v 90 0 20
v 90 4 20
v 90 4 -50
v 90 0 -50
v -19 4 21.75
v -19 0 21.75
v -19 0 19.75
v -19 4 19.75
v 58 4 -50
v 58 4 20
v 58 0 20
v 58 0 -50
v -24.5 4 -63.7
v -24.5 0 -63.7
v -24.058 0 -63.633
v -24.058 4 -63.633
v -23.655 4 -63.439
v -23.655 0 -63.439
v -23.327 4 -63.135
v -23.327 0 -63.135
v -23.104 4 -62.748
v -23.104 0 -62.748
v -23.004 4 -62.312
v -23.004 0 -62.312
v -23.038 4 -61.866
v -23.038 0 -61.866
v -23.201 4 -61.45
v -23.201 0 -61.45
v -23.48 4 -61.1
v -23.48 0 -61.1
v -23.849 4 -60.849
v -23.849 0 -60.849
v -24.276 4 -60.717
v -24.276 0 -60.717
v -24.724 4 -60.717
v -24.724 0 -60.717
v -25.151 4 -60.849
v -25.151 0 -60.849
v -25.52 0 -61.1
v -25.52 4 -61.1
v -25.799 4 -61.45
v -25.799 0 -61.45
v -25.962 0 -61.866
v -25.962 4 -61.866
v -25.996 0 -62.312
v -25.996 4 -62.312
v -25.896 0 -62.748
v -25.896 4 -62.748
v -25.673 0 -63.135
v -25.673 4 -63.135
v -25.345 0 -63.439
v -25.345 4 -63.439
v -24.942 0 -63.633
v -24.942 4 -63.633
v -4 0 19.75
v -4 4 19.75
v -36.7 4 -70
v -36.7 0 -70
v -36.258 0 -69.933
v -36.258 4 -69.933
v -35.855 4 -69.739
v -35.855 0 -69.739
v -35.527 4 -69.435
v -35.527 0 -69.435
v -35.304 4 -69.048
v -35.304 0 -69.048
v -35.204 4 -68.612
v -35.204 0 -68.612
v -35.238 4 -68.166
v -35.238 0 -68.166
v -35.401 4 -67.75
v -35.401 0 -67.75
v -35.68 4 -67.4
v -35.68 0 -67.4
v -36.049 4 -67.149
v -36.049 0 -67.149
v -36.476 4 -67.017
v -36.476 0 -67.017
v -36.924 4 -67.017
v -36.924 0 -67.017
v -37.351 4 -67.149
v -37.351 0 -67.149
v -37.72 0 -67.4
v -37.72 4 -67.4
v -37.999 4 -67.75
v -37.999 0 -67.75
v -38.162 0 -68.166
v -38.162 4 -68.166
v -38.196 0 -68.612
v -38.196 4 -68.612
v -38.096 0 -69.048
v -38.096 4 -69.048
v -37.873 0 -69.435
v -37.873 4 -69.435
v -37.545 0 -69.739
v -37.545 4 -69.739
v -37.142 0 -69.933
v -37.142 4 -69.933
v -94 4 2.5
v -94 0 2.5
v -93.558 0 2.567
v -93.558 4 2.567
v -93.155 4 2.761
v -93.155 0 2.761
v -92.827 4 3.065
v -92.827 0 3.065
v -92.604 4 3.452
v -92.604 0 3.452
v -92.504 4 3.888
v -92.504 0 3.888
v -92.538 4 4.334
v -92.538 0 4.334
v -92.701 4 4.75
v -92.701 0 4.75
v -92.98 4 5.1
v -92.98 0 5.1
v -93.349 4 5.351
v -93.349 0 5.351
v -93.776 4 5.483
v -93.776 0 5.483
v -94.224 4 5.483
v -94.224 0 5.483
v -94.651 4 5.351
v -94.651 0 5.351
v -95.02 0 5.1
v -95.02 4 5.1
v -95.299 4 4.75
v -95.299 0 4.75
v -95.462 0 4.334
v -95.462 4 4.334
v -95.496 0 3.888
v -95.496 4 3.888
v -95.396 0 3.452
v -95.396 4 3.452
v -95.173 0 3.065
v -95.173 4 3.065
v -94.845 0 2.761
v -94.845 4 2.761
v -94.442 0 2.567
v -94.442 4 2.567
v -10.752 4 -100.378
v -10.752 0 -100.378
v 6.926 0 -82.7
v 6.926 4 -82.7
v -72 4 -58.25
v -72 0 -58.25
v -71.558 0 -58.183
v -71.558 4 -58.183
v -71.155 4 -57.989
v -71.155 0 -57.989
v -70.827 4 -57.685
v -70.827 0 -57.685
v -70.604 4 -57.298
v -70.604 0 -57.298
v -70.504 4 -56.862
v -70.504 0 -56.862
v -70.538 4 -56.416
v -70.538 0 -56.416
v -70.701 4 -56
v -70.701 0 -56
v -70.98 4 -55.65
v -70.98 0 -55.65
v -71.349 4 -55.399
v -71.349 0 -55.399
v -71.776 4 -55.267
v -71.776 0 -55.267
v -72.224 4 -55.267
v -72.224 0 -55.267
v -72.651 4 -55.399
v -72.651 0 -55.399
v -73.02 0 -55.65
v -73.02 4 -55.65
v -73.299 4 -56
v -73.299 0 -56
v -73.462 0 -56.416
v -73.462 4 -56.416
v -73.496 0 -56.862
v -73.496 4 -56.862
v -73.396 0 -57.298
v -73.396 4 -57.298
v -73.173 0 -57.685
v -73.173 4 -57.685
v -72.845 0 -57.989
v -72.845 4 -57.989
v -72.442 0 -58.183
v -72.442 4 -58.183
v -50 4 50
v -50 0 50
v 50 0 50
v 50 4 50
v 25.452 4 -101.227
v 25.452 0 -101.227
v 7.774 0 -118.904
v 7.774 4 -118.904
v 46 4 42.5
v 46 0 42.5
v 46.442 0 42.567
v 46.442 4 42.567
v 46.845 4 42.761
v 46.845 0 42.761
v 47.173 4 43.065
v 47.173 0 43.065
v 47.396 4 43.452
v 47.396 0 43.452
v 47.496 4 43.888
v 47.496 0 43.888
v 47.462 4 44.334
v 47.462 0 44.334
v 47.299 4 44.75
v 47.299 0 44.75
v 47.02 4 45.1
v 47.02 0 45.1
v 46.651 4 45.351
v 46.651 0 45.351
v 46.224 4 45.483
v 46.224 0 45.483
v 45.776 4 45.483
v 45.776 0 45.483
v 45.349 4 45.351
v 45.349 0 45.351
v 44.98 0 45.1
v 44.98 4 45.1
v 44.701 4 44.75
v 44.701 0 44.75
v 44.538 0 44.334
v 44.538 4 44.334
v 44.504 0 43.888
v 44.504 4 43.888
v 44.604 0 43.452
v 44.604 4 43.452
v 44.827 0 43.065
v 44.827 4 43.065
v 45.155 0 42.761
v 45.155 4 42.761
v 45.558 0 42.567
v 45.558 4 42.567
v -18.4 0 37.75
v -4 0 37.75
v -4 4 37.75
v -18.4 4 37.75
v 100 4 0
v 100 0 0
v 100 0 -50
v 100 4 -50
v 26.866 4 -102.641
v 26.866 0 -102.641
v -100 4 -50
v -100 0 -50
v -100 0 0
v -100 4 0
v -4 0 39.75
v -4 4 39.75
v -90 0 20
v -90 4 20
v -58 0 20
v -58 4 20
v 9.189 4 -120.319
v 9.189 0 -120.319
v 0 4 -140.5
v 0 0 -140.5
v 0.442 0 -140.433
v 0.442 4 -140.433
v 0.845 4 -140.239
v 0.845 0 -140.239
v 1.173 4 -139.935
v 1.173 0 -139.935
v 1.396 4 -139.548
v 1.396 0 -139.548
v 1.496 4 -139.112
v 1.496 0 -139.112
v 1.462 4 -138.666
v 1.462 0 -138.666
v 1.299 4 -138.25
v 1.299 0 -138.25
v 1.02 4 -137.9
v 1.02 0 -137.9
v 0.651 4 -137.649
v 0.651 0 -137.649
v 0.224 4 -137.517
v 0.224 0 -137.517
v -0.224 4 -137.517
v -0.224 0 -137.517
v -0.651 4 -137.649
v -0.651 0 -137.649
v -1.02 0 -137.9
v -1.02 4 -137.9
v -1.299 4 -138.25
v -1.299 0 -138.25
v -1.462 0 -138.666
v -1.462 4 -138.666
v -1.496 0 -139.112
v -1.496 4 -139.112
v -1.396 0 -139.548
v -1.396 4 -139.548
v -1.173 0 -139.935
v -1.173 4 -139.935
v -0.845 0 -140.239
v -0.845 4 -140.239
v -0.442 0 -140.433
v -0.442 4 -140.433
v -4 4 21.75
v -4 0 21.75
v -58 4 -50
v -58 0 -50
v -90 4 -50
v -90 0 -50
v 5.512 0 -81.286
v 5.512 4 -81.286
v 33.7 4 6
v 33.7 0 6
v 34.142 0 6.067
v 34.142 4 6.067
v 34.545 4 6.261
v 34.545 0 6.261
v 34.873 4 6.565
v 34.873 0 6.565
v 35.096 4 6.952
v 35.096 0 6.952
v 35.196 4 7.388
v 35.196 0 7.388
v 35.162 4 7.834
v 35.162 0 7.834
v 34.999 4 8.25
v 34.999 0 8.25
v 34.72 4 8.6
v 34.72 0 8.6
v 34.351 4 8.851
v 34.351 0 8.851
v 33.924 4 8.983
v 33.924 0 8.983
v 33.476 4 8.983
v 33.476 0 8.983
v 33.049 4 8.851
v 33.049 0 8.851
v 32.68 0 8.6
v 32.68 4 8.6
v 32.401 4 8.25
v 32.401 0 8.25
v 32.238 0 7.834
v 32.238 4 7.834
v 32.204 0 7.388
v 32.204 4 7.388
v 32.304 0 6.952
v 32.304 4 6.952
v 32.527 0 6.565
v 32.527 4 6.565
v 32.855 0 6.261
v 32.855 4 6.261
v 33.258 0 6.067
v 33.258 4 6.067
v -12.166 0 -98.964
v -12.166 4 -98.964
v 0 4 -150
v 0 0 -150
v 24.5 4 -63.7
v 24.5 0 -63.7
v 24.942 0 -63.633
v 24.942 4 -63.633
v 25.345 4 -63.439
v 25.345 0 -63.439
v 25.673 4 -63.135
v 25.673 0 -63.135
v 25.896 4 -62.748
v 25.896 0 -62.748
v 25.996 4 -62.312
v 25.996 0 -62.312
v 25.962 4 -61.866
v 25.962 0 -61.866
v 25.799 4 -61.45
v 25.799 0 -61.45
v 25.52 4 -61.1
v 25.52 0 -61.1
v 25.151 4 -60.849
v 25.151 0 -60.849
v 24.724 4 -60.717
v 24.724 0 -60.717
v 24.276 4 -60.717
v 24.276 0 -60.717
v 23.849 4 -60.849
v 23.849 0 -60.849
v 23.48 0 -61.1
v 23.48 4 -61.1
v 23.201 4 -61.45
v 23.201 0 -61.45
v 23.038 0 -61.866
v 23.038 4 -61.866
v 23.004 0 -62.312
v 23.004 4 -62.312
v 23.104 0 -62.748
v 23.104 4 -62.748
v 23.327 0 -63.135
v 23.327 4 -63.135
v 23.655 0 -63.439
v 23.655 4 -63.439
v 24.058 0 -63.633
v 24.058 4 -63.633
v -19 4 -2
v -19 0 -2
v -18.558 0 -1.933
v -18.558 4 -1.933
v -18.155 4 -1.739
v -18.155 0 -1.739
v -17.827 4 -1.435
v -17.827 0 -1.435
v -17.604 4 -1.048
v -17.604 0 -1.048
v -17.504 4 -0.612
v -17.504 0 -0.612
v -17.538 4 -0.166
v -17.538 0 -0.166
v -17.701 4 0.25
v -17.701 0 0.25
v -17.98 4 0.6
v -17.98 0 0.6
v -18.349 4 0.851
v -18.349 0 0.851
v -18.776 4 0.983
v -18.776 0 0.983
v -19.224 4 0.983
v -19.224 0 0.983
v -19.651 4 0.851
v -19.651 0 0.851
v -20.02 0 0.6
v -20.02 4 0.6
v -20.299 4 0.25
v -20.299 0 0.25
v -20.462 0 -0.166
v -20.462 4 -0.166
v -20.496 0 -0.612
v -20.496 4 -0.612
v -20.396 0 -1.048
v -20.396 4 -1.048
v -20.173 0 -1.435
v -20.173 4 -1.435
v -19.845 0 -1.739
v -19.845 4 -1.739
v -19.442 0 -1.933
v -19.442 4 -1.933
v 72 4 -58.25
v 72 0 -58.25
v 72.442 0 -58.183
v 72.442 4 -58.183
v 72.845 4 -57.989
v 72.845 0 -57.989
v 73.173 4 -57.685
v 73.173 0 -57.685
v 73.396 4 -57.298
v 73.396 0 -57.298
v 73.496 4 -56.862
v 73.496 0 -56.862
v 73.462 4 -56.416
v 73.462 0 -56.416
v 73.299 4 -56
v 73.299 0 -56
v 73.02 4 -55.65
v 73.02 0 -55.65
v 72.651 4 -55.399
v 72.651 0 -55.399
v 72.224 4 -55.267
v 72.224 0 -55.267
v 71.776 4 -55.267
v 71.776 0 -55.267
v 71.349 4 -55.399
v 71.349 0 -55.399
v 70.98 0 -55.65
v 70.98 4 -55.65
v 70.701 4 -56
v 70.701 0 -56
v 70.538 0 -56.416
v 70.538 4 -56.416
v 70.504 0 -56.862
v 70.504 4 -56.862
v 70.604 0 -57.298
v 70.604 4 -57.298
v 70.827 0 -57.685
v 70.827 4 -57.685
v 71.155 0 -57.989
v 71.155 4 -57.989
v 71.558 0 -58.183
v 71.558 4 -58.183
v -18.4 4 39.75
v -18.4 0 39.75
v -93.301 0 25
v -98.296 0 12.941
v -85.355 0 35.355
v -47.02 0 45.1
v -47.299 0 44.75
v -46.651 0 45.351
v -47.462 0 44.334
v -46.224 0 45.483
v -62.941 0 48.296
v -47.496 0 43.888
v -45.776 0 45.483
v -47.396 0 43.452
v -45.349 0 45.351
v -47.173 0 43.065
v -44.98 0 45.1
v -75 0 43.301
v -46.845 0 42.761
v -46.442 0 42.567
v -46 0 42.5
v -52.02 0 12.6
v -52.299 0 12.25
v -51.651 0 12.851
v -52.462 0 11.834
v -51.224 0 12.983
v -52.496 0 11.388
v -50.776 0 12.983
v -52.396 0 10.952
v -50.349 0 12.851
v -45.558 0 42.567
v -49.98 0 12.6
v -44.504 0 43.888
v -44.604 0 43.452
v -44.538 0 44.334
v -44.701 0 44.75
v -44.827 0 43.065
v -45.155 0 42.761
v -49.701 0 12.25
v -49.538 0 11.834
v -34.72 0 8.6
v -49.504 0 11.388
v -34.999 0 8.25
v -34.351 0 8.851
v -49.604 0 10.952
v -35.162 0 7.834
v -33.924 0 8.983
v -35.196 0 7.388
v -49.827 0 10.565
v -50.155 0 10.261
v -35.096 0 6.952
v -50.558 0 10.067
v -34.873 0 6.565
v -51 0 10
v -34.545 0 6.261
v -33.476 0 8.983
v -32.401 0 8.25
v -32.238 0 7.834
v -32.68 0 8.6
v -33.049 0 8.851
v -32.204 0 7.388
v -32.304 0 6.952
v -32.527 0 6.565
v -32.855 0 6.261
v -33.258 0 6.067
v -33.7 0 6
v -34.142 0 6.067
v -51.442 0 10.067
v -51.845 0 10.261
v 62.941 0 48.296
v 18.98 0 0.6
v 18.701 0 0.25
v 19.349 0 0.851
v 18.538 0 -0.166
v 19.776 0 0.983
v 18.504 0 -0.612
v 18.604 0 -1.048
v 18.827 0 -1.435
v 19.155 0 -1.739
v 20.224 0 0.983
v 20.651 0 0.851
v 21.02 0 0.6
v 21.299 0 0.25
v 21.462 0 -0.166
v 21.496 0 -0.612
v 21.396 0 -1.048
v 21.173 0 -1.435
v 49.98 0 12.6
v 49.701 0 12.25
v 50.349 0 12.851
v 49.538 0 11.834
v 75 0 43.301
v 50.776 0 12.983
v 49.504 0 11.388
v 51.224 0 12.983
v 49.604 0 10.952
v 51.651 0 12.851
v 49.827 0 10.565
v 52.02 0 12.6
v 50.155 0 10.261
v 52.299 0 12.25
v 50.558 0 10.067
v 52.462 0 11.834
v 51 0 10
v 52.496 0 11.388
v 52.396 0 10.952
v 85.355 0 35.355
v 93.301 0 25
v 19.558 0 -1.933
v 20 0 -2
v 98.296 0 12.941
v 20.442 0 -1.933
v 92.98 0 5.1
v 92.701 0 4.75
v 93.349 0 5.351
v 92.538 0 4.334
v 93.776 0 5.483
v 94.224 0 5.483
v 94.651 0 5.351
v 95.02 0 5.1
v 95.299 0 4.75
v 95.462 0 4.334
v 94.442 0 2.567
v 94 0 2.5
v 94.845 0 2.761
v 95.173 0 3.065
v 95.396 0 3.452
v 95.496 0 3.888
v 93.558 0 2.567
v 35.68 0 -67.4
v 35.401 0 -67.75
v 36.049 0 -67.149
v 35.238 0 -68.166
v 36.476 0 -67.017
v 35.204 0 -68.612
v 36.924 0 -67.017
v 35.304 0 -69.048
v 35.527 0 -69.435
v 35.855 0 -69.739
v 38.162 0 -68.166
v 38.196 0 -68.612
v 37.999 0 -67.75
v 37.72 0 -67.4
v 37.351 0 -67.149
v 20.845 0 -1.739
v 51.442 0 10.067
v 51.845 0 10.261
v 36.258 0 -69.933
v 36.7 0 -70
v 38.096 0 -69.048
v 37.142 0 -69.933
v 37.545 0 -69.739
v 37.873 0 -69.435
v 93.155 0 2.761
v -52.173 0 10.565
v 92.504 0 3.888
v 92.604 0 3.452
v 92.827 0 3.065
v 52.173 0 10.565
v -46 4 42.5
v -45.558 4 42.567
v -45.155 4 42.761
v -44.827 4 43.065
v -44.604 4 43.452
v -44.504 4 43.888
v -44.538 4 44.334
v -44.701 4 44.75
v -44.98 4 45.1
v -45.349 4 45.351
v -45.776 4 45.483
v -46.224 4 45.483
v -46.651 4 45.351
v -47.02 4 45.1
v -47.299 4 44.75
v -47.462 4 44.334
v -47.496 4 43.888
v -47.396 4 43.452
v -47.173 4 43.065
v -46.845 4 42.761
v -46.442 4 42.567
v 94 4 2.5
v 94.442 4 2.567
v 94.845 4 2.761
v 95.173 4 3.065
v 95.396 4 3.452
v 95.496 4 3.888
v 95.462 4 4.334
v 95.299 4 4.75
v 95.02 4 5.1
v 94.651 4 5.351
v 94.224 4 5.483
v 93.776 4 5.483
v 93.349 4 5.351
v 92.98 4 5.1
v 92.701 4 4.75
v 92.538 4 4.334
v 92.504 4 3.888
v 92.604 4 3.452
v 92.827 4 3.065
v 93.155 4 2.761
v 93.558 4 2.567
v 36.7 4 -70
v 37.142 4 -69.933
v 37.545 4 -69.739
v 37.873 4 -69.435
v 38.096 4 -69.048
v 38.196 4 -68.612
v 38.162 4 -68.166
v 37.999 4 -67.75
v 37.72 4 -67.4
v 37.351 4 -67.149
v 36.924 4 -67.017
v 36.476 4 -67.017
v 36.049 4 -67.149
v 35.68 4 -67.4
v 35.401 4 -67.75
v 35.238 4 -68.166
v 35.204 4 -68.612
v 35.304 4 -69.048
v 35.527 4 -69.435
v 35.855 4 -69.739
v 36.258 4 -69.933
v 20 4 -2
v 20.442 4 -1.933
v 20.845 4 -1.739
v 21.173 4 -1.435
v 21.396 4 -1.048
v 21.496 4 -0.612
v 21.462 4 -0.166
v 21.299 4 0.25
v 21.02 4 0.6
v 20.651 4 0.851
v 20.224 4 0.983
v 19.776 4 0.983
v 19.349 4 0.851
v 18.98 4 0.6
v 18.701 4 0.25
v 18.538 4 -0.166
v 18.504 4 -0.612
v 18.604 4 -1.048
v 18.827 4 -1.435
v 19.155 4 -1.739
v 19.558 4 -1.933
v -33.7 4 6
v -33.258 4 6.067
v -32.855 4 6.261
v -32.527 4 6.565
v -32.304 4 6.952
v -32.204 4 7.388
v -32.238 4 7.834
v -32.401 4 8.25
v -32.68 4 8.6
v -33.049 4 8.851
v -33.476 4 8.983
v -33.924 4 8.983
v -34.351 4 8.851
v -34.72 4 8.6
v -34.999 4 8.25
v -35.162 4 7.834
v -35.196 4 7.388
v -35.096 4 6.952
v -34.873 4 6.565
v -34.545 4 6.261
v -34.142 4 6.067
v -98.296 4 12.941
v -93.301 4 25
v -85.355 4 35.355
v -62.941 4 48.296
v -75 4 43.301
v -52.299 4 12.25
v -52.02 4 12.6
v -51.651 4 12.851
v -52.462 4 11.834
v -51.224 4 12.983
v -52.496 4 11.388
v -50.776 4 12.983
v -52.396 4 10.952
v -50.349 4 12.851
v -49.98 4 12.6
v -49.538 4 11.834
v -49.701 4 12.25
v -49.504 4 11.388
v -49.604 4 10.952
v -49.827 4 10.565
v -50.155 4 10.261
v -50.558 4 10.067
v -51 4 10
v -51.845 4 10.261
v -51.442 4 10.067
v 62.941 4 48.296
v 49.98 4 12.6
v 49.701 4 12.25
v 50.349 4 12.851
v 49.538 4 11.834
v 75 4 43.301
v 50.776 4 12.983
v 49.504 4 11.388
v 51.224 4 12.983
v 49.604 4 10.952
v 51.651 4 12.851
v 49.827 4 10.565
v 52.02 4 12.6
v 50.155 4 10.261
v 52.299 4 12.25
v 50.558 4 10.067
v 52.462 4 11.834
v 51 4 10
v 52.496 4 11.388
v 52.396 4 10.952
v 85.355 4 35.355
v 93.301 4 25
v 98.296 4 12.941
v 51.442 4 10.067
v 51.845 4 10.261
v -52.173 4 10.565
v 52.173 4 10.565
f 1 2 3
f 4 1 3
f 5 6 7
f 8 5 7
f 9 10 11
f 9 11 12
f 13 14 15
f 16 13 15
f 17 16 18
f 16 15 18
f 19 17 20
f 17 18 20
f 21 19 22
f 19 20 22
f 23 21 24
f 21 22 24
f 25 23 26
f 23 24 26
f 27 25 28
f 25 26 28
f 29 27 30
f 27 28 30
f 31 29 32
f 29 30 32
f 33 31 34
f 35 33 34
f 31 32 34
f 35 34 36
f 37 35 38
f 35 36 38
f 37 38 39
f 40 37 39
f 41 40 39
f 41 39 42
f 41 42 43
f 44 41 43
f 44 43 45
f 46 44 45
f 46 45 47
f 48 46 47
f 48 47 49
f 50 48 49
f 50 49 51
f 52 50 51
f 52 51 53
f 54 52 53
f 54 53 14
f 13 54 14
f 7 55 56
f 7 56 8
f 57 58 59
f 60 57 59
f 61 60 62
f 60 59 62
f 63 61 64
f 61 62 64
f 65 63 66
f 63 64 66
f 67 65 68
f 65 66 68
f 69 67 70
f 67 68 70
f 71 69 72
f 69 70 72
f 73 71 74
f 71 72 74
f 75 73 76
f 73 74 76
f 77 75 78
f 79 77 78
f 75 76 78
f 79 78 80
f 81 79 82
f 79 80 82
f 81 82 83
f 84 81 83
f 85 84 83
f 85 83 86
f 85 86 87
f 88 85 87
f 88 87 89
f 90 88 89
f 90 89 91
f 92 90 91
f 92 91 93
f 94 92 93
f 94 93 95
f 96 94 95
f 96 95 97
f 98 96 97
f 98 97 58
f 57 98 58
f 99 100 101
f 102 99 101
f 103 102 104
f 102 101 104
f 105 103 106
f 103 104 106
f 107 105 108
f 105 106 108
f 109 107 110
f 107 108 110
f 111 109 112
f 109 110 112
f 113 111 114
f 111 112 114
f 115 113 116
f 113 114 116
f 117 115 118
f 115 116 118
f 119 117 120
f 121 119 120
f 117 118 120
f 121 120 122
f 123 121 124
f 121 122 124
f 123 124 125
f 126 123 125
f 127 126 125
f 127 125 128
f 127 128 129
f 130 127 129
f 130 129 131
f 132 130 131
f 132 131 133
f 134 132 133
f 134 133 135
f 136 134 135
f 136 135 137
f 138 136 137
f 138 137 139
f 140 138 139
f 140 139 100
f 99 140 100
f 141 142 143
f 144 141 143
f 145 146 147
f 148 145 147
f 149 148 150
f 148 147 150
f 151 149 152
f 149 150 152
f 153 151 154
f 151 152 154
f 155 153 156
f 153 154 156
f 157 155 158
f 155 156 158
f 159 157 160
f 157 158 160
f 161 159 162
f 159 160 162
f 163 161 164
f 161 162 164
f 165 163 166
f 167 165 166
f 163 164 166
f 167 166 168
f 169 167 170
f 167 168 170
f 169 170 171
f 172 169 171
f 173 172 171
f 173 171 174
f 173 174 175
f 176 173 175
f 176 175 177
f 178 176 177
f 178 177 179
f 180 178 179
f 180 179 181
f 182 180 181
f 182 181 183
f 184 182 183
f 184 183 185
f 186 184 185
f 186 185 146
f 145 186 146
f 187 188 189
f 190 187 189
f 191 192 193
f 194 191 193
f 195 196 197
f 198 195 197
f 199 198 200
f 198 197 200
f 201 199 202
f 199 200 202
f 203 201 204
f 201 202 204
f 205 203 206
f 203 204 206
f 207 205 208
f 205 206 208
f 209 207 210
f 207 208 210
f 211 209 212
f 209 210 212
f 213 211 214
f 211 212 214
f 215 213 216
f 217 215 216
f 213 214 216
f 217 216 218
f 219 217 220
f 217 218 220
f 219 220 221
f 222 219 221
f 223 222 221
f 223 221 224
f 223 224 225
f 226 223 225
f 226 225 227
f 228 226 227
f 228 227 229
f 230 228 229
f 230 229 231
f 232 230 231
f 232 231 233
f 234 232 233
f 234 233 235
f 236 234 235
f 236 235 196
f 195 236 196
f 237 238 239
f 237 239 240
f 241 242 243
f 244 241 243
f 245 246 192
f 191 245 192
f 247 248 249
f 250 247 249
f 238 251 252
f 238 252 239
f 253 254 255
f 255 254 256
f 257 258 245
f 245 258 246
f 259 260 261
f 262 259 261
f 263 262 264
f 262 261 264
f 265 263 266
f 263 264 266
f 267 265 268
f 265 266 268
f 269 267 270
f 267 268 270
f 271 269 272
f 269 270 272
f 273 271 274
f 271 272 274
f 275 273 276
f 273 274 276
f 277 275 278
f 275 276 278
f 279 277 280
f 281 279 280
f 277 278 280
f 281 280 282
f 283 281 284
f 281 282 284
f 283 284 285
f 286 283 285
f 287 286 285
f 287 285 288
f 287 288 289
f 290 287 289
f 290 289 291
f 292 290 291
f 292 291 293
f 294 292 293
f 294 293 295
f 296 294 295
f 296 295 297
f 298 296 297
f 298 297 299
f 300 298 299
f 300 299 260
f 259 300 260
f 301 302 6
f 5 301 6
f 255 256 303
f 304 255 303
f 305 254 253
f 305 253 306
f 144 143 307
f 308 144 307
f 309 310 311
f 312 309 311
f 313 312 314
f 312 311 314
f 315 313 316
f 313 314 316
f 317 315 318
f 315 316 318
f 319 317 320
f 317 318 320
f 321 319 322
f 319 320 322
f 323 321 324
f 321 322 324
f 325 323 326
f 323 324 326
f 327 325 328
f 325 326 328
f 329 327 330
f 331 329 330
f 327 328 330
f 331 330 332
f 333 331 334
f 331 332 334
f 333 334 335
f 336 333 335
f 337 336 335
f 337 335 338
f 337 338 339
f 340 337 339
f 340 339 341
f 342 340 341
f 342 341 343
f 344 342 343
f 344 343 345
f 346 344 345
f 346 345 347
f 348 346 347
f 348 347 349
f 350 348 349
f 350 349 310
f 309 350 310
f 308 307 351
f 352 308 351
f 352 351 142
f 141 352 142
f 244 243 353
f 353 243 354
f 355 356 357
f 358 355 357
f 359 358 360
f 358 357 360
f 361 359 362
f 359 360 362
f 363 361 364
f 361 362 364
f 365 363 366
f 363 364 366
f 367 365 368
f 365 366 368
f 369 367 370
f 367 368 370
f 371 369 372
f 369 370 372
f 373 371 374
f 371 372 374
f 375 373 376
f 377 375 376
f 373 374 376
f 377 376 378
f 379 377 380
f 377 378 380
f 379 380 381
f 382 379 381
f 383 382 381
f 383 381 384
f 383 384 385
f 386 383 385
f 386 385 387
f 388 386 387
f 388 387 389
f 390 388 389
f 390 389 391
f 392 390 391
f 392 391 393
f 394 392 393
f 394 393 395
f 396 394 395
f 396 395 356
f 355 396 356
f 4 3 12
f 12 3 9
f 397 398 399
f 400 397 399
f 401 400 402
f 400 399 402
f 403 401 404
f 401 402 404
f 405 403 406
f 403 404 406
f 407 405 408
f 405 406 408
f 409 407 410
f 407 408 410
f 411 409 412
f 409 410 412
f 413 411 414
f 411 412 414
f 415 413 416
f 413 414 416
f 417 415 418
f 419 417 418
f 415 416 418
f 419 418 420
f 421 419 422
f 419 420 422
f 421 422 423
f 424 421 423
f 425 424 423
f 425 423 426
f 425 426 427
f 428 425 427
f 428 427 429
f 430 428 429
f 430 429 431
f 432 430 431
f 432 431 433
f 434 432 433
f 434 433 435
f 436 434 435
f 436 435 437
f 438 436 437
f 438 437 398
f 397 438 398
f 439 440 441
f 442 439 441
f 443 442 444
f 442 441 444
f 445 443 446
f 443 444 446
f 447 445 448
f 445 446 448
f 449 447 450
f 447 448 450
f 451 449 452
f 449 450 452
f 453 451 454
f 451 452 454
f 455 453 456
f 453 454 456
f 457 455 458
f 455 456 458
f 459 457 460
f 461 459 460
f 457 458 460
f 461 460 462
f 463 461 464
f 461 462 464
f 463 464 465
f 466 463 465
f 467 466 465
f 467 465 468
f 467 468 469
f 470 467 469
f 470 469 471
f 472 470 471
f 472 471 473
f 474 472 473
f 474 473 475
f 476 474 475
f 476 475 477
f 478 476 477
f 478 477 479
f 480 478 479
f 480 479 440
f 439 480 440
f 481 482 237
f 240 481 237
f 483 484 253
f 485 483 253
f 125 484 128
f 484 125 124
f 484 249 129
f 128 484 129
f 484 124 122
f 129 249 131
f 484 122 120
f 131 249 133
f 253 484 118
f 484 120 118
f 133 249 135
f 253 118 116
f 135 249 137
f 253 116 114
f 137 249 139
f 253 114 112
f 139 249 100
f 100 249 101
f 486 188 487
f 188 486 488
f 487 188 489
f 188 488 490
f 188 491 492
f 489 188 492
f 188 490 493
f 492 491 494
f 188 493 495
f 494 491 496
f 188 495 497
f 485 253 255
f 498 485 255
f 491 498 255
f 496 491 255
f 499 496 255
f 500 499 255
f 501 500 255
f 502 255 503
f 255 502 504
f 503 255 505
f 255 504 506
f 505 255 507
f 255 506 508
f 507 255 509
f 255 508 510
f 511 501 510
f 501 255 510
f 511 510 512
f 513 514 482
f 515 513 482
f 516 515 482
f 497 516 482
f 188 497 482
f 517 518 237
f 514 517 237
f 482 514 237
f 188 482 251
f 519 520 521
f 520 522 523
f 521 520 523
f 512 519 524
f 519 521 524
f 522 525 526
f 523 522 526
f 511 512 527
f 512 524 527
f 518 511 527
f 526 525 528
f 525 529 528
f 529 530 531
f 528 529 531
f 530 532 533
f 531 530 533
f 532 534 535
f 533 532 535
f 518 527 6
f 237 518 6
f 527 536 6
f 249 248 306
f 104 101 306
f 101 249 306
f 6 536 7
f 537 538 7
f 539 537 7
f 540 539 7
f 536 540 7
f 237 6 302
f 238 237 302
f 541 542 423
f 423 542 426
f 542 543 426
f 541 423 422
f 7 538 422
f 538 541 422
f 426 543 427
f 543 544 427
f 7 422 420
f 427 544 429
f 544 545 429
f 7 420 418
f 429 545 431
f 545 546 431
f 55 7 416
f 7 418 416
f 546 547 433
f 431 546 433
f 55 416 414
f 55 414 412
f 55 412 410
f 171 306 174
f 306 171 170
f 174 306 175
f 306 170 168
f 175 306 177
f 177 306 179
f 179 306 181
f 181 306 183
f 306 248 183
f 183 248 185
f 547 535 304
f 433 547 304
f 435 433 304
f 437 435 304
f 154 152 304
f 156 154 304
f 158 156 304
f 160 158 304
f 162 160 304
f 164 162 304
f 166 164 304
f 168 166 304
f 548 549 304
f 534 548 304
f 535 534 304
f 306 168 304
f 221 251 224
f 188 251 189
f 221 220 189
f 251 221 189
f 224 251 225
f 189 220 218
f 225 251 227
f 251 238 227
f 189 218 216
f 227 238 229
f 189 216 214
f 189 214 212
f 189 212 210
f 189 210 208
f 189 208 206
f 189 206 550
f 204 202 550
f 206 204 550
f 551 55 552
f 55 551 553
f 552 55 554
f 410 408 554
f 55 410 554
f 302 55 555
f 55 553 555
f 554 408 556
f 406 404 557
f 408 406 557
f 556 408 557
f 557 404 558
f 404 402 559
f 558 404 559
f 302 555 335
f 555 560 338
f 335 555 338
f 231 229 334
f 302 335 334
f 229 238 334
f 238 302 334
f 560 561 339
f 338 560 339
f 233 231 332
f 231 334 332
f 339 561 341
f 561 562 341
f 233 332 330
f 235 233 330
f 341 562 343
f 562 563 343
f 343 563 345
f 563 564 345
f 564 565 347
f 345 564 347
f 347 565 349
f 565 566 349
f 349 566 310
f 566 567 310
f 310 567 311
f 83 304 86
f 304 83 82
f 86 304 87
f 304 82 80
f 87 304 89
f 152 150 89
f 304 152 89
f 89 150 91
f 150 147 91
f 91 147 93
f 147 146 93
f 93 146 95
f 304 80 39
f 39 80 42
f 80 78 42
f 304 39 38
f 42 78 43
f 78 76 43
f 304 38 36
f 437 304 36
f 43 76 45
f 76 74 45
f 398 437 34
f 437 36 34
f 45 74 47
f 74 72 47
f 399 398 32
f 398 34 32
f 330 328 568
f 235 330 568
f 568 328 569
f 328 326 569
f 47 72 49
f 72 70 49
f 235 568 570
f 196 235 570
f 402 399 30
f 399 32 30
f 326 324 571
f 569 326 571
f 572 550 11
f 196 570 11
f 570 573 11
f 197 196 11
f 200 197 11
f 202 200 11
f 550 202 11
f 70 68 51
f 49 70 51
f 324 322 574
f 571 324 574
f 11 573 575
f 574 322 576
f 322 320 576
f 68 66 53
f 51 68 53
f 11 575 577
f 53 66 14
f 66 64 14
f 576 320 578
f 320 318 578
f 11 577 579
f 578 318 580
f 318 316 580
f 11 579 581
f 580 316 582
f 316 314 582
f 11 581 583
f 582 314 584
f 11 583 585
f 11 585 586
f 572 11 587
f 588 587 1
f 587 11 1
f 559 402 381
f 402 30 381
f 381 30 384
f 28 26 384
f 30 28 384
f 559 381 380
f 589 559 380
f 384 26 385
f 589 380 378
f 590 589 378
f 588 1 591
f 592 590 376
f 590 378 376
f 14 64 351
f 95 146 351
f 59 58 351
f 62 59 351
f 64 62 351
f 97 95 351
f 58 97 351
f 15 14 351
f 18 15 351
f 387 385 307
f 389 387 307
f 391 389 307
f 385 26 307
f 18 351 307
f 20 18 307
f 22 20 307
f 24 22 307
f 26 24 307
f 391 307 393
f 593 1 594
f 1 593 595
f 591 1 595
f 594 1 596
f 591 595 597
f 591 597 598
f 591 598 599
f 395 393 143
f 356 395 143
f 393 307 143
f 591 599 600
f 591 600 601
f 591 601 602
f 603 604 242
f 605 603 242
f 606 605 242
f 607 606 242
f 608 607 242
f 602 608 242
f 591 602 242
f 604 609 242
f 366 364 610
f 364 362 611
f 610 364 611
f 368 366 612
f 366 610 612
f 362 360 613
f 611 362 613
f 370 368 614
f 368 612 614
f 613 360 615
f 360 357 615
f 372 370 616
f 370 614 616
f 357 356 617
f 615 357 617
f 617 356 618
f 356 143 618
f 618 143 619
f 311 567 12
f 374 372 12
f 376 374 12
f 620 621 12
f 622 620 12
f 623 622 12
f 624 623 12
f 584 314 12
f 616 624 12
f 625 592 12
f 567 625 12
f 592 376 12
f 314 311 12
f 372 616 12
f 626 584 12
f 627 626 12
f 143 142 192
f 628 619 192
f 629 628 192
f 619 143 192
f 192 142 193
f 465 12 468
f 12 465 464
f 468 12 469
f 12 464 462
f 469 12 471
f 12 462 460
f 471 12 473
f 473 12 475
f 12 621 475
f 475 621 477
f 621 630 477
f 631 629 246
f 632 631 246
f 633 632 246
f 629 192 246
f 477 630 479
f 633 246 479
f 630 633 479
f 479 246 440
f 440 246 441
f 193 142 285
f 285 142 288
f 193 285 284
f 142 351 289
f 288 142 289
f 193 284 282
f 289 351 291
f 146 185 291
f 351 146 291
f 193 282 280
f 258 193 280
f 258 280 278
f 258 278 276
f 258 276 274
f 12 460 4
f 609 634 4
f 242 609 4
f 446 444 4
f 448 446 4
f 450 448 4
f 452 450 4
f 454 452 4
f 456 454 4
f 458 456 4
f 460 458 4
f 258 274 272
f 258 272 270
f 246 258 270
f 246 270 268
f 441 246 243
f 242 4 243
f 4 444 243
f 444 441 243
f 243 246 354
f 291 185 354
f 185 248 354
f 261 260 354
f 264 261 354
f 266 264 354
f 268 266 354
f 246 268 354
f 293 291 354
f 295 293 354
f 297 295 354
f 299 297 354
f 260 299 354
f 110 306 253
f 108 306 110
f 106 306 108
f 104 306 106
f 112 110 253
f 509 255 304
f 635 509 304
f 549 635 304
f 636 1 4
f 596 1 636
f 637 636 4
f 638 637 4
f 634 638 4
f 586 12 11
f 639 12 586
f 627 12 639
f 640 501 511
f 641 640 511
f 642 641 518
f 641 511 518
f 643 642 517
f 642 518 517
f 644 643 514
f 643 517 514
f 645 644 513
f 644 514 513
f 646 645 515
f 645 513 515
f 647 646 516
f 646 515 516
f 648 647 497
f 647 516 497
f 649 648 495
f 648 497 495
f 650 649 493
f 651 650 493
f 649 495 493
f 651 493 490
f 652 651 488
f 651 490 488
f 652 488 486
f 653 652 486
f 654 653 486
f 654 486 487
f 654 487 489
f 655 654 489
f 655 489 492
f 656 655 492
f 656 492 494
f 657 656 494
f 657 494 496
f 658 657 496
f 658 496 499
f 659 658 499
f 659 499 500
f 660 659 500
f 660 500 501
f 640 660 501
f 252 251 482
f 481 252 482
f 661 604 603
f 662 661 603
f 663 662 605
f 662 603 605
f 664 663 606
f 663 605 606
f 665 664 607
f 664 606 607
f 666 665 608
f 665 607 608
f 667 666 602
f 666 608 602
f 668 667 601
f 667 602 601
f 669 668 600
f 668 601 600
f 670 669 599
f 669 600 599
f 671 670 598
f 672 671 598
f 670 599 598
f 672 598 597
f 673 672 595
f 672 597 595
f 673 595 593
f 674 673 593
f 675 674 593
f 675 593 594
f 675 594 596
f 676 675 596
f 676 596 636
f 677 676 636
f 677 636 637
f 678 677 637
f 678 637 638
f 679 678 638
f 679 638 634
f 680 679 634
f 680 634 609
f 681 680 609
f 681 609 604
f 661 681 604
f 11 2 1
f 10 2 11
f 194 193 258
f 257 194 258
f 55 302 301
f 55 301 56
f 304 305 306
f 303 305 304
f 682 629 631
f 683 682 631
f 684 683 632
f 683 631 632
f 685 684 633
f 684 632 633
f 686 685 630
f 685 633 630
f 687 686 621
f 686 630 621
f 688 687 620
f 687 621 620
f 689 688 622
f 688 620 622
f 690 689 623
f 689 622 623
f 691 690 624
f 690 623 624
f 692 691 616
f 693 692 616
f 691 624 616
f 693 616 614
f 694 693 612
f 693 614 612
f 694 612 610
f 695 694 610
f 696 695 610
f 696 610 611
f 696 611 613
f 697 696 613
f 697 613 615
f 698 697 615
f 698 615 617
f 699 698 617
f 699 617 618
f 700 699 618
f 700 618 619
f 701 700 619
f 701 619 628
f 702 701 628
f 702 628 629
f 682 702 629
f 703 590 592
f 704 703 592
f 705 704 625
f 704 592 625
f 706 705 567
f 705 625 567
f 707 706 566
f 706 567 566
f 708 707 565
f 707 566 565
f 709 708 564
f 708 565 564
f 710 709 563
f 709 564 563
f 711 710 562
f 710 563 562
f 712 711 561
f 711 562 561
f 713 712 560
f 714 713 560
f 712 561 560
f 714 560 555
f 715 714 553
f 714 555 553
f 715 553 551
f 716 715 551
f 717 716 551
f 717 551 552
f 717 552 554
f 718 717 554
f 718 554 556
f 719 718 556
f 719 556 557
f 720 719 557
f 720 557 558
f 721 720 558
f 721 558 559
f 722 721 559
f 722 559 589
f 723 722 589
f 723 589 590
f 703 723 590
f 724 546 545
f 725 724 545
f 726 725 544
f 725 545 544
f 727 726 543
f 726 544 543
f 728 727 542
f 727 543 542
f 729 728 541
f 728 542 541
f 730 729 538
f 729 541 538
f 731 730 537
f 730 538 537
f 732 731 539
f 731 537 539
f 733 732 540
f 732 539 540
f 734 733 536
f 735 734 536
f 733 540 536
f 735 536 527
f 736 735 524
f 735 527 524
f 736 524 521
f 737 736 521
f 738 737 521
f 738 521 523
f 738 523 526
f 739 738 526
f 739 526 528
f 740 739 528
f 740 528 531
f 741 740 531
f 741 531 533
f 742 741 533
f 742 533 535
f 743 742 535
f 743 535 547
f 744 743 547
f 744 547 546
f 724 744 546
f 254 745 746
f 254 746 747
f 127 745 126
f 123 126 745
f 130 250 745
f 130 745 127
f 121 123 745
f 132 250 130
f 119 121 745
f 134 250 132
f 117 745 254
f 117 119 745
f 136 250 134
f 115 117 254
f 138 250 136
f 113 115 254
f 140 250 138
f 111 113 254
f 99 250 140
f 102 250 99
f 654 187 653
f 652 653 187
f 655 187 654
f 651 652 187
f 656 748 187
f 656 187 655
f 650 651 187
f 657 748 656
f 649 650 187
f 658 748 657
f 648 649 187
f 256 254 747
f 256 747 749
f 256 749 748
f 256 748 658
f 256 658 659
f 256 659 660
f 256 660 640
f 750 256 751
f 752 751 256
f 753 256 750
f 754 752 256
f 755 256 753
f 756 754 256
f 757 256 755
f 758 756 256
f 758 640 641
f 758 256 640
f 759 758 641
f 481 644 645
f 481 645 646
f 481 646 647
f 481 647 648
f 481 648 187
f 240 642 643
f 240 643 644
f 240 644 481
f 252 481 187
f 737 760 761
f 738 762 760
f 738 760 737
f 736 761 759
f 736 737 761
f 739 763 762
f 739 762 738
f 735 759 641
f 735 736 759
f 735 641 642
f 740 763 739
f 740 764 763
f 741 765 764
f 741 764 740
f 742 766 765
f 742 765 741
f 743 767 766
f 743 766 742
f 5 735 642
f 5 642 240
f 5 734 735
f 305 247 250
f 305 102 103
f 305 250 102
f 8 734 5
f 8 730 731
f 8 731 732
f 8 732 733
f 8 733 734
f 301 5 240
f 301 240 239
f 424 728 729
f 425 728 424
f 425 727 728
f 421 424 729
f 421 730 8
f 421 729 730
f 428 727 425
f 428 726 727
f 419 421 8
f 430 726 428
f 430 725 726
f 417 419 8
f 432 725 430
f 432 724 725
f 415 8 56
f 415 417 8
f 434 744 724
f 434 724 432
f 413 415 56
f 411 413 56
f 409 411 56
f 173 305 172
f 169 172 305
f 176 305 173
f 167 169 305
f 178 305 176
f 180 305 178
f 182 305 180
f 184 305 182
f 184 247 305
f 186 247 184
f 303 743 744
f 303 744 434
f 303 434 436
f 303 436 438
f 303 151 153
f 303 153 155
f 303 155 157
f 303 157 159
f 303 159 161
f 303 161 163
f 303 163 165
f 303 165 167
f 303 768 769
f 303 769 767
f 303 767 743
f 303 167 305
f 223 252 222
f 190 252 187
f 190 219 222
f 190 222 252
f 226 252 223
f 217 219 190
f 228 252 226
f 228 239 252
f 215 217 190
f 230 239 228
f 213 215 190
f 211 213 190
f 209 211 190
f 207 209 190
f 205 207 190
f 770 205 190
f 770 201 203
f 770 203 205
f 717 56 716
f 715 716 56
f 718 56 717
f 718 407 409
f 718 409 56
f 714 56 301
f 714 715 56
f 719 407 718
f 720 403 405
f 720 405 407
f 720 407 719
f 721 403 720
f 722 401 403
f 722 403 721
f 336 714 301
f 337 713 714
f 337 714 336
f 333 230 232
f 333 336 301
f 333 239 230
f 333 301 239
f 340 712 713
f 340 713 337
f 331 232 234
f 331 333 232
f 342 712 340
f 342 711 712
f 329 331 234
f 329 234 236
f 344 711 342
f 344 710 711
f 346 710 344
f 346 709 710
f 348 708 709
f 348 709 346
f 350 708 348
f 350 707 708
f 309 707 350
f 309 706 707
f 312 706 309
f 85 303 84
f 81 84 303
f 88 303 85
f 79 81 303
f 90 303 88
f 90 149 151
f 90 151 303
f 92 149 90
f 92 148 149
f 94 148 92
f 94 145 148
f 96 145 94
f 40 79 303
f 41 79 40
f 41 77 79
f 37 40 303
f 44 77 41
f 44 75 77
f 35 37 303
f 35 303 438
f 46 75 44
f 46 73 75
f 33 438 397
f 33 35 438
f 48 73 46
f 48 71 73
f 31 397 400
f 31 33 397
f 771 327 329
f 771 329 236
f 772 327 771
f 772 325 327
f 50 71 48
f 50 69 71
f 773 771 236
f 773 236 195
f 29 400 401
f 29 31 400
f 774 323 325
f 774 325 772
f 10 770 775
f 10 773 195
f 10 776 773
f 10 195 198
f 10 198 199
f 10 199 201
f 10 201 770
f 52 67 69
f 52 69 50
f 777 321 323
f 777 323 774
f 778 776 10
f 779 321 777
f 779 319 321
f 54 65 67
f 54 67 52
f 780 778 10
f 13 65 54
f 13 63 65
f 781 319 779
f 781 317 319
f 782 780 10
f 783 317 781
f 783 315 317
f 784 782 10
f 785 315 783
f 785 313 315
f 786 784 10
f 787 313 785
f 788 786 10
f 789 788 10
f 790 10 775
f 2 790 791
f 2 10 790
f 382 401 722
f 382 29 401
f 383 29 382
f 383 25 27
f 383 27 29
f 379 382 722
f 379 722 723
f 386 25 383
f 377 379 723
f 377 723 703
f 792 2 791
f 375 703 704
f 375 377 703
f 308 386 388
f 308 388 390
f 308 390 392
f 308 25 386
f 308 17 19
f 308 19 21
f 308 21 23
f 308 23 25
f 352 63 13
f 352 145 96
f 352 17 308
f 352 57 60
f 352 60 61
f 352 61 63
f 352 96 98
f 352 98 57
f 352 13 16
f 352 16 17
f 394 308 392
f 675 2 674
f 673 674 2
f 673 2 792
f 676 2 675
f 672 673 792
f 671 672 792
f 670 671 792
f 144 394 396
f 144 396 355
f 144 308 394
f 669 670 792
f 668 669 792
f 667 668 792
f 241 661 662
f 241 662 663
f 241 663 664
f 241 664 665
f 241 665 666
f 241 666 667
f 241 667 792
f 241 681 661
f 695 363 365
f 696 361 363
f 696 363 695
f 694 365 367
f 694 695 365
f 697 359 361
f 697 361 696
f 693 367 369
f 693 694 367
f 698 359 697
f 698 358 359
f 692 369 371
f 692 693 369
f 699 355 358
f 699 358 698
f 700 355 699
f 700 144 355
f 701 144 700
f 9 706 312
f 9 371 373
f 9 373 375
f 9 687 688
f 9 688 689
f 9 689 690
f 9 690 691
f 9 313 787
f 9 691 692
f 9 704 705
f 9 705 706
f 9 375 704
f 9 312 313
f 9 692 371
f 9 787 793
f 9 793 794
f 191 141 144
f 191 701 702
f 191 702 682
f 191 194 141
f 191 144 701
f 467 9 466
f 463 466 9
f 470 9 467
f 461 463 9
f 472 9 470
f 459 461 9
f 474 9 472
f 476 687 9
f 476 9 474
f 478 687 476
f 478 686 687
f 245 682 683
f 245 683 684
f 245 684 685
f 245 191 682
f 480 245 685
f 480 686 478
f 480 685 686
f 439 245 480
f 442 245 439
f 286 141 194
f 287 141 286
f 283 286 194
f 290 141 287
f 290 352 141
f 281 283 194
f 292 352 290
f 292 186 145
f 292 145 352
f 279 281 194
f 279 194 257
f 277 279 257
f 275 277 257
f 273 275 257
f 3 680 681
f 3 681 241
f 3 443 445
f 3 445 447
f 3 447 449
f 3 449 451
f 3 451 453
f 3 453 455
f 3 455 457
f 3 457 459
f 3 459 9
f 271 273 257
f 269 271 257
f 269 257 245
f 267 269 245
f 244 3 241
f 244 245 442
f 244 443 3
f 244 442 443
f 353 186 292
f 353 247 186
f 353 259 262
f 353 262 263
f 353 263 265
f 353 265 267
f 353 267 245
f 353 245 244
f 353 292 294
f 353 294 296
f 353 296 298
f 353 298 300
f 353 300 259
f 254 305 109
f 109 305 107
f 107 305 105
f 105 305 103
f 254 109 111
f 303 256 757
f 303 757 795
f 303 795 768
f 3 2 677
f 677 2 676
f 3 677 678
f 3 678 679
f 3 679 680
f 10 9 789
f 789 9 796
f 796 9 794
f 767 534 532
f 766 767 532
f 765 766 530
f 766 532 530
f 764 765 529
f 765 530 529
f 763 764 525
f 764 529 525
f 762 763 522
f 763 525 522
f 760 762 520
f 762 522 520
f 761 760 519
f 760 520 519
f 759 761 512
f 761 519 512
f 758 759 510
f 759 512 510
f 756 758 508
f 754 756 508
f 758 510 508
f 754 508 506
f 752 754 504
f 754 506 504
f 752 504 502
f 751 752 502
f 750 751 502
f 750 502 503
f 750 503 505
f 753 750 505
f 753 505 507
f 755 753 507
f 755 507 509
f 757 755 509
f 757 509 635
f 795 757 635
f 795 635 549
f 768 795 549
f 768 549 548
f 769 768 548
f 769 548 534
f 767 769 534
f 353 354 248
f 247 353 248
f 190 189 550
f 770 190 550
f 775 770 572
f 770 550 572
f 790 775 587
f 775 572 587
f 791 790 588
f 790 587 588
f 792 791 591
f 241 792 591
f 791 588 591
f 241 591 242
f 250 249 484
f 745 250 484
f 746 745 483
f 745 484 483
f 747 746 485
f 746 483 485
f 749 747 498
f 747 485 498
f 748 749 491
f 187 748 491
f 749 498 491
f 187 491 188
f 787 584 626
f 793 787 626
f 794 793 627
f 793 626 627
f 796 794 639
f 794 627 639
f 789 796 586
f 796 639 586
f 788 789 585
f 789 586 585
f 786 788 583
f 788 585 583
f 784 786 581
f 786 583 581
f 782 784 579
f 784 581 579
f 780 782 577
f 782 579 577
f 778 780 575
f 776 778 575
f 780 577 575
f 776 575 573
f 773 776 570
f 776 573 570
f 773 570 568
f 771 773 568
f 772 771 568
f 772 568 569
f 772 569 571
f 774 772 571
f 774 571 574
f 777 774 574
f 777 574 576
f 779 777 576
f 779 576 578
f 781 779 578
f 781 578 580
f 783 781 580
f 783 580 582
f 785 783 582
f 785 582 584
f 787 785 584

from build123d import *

# Parameters (mm, degrees)
BASIS_GRONDPLAAT_DEPTH = 4
WIELGATEN_SCHETS_W     = 32
WIELGATEN_SCHETS_H     = 70
WIELGATEN_DEPTH        = 10
BOORGAT1_SCHETS_R      = 1.5
BOORGAT1_DEPTH         = 181.321934329
SKETCH1_R              = 1.5
SKETCH1_W              = 15
SKETCH1_H              = 2
SKETCH1_W_2            = 14.4
CUT_EXTRUDE1_DEPTH     = 10
SKETCH2_R              = 1.5
CUT_EXTRUDE2_DEPTH     = 10


with BuildPart() as part:
    # basis_grondplaat_schets → basis_grondplaat (new body)
    with BuildSketch(Plane(origin=(0, 0, 0), x_dir=(1, 0, 0), z_dir=(0, 1, 0))):
        with BuildLine():
            Line((-50, -50), (50, -50))
            ThreePointArc((50, -50), (85.355339059, -35.355339059), (100, 0))
            Line((100, 0), (100, 50))
            Line((100, 50), (0, 150))
            Line((0, 150), (-100, 50))
            Line((-100, 50), (-100, 0))
            ThreePointArc((-100, 0), (-85.355339059, -35.355339059), (-50, -50))
        make_face()
    extrude(amount=BASIS_GRONDPLAAT_DEPTH)

    # wielgaten_schets → wielgaten (cut)
    with BuildSketch(Plane(origin=(0, 4, 0), x_dir=(1, 0, 0), z_dir=(0, 1, 0))):
        with Locations((-74, 15)):
            Rectangle(WIELGATEN_SCHETS_W, WIELGATEN_SCHETS_H)
    wielgaten = extrude(amount=-WIELGATEN_DEPTH, mode=Mode.SUBTRACT)

    # boorgat1_schets → boorgat1 (cut, through all)
    with BuildSketch(Plane.XZ):
        with Locations(Location((-46, 44, 0), (0, 0, 270))):
            Circle(BOORGAT1_SCHETS_R)
    extrude(amount=-BOORGAT1_DEPTH, mode=Mode.SUBTRACT)

    # Mirror1: wielgaten across plane
    add(wielgaten.mirror(Plane(origin=(0, 0, 0), x_dir=(0, 0, 1), z_dir=(1, 0, 0))), mode=Mode.SUBTRACT)

    # Sketch1 → Cut-Extrude1 (cut)
    with BuildSketch(Plane(origin=(0, 0, 0), x_dir=(-1, 0, 0), z_dir=(0, -1, 0))):
        with Locations(Location((-46, -44, 0), (0, 0, 90))):
            Circle(SKETCH1_R)
        with Locations(Location((-94, -4, 0), (0, 0, 90))):
            Circle(SKETCH1_R)
        with Locations(Location((94, -4, 0), (0, 0, 90))):
            Circle(SKETCH1_R)
        with Locations(Location((0, 139, 0), (0, 0, 90))):
            Circle(SKETCH1_R)
        with Locations(Location((24.5, 62.2, 0), (0, 0, 90))):
            Circle(SKETCH1_R)
        with Locations(Location((-24.5, 62.2, 0), (0, 0, 90))):
            Circle(SKETCH1_R)
        with Locations(Location((-20, 0.5, 0), (0, 0, 90))):
            Circle(SKETCH1_R)
        with Locations(Location((19, 0.5, 0), (0, 0, 90))):
            Circle(SKETCH1_R)
        Polygon((10.751885446, 100.378121725), (-6.925784083, 82.700452195), (-5.511570521, 81.286238633), (12.166099009, 98.963908163), align=None)
        Polygon((-25.45198175, 101.226649863), (-7.774312221, 118.904319392), (-9.188525783, 120.318532955), (-26.866195313, 102.640863425), align=None)
        with Locations((11.5, -20.75)):
            Rectangle(SKETCH1_W, SKETCH1_H)
        with Locations((11.2, -38.75)):
            Rectangle(SKETCH1_W_2, SKETCH1_H)
    extrude(amount=-CUT_EXTRUDE1_DEPTH, mode=Mode.SUBTRACT)

    # Sketch2 → Cut-Extrude2 (cut)
    with BuildSketch(Plane(origin=(0, 0, 0), x_dir=(-1, 0, 0), z_dir=(0, -1, 0))):
        with Locations(Location((51, -11.5, 0), (0, 0, 90))):
            Circle(SKETCH2_R)
        with Locations(Location((33.7, -7.5, 0), (0, 0, 90))):
            Circle(SKETCH2_R)
        with Locations(Location((-33.7, -7.5, 0), (0, 0, 90))):
            Circle(SKETCH2_R)
        with Locations(Location((-51, -11.5, 0), (0, 0, 90))):
            Circle(SKETCH2_R)
        with Locations(Location((36.7, 68.5, 0), (0, 0, 90))):
            Circle(SKETCH2_R)
        with Locations(Location((-36.7, 68.5, 0), (0, 0, 90))):
            Circle(SKETCH2_R)
        with Locations(Location((-72, 56.75, 0), (0, 0, 90))):
            Circle(SKETCH2_R)
        with Locations(Location((72, 56.75, 0), (0, 0, 90))):
            Circle(SKETCH2_R)
    extrude(amount=-CUT_EXTRUDE2_DEPTH, mode=Mode.SUBTRACT)


solid = part.part
